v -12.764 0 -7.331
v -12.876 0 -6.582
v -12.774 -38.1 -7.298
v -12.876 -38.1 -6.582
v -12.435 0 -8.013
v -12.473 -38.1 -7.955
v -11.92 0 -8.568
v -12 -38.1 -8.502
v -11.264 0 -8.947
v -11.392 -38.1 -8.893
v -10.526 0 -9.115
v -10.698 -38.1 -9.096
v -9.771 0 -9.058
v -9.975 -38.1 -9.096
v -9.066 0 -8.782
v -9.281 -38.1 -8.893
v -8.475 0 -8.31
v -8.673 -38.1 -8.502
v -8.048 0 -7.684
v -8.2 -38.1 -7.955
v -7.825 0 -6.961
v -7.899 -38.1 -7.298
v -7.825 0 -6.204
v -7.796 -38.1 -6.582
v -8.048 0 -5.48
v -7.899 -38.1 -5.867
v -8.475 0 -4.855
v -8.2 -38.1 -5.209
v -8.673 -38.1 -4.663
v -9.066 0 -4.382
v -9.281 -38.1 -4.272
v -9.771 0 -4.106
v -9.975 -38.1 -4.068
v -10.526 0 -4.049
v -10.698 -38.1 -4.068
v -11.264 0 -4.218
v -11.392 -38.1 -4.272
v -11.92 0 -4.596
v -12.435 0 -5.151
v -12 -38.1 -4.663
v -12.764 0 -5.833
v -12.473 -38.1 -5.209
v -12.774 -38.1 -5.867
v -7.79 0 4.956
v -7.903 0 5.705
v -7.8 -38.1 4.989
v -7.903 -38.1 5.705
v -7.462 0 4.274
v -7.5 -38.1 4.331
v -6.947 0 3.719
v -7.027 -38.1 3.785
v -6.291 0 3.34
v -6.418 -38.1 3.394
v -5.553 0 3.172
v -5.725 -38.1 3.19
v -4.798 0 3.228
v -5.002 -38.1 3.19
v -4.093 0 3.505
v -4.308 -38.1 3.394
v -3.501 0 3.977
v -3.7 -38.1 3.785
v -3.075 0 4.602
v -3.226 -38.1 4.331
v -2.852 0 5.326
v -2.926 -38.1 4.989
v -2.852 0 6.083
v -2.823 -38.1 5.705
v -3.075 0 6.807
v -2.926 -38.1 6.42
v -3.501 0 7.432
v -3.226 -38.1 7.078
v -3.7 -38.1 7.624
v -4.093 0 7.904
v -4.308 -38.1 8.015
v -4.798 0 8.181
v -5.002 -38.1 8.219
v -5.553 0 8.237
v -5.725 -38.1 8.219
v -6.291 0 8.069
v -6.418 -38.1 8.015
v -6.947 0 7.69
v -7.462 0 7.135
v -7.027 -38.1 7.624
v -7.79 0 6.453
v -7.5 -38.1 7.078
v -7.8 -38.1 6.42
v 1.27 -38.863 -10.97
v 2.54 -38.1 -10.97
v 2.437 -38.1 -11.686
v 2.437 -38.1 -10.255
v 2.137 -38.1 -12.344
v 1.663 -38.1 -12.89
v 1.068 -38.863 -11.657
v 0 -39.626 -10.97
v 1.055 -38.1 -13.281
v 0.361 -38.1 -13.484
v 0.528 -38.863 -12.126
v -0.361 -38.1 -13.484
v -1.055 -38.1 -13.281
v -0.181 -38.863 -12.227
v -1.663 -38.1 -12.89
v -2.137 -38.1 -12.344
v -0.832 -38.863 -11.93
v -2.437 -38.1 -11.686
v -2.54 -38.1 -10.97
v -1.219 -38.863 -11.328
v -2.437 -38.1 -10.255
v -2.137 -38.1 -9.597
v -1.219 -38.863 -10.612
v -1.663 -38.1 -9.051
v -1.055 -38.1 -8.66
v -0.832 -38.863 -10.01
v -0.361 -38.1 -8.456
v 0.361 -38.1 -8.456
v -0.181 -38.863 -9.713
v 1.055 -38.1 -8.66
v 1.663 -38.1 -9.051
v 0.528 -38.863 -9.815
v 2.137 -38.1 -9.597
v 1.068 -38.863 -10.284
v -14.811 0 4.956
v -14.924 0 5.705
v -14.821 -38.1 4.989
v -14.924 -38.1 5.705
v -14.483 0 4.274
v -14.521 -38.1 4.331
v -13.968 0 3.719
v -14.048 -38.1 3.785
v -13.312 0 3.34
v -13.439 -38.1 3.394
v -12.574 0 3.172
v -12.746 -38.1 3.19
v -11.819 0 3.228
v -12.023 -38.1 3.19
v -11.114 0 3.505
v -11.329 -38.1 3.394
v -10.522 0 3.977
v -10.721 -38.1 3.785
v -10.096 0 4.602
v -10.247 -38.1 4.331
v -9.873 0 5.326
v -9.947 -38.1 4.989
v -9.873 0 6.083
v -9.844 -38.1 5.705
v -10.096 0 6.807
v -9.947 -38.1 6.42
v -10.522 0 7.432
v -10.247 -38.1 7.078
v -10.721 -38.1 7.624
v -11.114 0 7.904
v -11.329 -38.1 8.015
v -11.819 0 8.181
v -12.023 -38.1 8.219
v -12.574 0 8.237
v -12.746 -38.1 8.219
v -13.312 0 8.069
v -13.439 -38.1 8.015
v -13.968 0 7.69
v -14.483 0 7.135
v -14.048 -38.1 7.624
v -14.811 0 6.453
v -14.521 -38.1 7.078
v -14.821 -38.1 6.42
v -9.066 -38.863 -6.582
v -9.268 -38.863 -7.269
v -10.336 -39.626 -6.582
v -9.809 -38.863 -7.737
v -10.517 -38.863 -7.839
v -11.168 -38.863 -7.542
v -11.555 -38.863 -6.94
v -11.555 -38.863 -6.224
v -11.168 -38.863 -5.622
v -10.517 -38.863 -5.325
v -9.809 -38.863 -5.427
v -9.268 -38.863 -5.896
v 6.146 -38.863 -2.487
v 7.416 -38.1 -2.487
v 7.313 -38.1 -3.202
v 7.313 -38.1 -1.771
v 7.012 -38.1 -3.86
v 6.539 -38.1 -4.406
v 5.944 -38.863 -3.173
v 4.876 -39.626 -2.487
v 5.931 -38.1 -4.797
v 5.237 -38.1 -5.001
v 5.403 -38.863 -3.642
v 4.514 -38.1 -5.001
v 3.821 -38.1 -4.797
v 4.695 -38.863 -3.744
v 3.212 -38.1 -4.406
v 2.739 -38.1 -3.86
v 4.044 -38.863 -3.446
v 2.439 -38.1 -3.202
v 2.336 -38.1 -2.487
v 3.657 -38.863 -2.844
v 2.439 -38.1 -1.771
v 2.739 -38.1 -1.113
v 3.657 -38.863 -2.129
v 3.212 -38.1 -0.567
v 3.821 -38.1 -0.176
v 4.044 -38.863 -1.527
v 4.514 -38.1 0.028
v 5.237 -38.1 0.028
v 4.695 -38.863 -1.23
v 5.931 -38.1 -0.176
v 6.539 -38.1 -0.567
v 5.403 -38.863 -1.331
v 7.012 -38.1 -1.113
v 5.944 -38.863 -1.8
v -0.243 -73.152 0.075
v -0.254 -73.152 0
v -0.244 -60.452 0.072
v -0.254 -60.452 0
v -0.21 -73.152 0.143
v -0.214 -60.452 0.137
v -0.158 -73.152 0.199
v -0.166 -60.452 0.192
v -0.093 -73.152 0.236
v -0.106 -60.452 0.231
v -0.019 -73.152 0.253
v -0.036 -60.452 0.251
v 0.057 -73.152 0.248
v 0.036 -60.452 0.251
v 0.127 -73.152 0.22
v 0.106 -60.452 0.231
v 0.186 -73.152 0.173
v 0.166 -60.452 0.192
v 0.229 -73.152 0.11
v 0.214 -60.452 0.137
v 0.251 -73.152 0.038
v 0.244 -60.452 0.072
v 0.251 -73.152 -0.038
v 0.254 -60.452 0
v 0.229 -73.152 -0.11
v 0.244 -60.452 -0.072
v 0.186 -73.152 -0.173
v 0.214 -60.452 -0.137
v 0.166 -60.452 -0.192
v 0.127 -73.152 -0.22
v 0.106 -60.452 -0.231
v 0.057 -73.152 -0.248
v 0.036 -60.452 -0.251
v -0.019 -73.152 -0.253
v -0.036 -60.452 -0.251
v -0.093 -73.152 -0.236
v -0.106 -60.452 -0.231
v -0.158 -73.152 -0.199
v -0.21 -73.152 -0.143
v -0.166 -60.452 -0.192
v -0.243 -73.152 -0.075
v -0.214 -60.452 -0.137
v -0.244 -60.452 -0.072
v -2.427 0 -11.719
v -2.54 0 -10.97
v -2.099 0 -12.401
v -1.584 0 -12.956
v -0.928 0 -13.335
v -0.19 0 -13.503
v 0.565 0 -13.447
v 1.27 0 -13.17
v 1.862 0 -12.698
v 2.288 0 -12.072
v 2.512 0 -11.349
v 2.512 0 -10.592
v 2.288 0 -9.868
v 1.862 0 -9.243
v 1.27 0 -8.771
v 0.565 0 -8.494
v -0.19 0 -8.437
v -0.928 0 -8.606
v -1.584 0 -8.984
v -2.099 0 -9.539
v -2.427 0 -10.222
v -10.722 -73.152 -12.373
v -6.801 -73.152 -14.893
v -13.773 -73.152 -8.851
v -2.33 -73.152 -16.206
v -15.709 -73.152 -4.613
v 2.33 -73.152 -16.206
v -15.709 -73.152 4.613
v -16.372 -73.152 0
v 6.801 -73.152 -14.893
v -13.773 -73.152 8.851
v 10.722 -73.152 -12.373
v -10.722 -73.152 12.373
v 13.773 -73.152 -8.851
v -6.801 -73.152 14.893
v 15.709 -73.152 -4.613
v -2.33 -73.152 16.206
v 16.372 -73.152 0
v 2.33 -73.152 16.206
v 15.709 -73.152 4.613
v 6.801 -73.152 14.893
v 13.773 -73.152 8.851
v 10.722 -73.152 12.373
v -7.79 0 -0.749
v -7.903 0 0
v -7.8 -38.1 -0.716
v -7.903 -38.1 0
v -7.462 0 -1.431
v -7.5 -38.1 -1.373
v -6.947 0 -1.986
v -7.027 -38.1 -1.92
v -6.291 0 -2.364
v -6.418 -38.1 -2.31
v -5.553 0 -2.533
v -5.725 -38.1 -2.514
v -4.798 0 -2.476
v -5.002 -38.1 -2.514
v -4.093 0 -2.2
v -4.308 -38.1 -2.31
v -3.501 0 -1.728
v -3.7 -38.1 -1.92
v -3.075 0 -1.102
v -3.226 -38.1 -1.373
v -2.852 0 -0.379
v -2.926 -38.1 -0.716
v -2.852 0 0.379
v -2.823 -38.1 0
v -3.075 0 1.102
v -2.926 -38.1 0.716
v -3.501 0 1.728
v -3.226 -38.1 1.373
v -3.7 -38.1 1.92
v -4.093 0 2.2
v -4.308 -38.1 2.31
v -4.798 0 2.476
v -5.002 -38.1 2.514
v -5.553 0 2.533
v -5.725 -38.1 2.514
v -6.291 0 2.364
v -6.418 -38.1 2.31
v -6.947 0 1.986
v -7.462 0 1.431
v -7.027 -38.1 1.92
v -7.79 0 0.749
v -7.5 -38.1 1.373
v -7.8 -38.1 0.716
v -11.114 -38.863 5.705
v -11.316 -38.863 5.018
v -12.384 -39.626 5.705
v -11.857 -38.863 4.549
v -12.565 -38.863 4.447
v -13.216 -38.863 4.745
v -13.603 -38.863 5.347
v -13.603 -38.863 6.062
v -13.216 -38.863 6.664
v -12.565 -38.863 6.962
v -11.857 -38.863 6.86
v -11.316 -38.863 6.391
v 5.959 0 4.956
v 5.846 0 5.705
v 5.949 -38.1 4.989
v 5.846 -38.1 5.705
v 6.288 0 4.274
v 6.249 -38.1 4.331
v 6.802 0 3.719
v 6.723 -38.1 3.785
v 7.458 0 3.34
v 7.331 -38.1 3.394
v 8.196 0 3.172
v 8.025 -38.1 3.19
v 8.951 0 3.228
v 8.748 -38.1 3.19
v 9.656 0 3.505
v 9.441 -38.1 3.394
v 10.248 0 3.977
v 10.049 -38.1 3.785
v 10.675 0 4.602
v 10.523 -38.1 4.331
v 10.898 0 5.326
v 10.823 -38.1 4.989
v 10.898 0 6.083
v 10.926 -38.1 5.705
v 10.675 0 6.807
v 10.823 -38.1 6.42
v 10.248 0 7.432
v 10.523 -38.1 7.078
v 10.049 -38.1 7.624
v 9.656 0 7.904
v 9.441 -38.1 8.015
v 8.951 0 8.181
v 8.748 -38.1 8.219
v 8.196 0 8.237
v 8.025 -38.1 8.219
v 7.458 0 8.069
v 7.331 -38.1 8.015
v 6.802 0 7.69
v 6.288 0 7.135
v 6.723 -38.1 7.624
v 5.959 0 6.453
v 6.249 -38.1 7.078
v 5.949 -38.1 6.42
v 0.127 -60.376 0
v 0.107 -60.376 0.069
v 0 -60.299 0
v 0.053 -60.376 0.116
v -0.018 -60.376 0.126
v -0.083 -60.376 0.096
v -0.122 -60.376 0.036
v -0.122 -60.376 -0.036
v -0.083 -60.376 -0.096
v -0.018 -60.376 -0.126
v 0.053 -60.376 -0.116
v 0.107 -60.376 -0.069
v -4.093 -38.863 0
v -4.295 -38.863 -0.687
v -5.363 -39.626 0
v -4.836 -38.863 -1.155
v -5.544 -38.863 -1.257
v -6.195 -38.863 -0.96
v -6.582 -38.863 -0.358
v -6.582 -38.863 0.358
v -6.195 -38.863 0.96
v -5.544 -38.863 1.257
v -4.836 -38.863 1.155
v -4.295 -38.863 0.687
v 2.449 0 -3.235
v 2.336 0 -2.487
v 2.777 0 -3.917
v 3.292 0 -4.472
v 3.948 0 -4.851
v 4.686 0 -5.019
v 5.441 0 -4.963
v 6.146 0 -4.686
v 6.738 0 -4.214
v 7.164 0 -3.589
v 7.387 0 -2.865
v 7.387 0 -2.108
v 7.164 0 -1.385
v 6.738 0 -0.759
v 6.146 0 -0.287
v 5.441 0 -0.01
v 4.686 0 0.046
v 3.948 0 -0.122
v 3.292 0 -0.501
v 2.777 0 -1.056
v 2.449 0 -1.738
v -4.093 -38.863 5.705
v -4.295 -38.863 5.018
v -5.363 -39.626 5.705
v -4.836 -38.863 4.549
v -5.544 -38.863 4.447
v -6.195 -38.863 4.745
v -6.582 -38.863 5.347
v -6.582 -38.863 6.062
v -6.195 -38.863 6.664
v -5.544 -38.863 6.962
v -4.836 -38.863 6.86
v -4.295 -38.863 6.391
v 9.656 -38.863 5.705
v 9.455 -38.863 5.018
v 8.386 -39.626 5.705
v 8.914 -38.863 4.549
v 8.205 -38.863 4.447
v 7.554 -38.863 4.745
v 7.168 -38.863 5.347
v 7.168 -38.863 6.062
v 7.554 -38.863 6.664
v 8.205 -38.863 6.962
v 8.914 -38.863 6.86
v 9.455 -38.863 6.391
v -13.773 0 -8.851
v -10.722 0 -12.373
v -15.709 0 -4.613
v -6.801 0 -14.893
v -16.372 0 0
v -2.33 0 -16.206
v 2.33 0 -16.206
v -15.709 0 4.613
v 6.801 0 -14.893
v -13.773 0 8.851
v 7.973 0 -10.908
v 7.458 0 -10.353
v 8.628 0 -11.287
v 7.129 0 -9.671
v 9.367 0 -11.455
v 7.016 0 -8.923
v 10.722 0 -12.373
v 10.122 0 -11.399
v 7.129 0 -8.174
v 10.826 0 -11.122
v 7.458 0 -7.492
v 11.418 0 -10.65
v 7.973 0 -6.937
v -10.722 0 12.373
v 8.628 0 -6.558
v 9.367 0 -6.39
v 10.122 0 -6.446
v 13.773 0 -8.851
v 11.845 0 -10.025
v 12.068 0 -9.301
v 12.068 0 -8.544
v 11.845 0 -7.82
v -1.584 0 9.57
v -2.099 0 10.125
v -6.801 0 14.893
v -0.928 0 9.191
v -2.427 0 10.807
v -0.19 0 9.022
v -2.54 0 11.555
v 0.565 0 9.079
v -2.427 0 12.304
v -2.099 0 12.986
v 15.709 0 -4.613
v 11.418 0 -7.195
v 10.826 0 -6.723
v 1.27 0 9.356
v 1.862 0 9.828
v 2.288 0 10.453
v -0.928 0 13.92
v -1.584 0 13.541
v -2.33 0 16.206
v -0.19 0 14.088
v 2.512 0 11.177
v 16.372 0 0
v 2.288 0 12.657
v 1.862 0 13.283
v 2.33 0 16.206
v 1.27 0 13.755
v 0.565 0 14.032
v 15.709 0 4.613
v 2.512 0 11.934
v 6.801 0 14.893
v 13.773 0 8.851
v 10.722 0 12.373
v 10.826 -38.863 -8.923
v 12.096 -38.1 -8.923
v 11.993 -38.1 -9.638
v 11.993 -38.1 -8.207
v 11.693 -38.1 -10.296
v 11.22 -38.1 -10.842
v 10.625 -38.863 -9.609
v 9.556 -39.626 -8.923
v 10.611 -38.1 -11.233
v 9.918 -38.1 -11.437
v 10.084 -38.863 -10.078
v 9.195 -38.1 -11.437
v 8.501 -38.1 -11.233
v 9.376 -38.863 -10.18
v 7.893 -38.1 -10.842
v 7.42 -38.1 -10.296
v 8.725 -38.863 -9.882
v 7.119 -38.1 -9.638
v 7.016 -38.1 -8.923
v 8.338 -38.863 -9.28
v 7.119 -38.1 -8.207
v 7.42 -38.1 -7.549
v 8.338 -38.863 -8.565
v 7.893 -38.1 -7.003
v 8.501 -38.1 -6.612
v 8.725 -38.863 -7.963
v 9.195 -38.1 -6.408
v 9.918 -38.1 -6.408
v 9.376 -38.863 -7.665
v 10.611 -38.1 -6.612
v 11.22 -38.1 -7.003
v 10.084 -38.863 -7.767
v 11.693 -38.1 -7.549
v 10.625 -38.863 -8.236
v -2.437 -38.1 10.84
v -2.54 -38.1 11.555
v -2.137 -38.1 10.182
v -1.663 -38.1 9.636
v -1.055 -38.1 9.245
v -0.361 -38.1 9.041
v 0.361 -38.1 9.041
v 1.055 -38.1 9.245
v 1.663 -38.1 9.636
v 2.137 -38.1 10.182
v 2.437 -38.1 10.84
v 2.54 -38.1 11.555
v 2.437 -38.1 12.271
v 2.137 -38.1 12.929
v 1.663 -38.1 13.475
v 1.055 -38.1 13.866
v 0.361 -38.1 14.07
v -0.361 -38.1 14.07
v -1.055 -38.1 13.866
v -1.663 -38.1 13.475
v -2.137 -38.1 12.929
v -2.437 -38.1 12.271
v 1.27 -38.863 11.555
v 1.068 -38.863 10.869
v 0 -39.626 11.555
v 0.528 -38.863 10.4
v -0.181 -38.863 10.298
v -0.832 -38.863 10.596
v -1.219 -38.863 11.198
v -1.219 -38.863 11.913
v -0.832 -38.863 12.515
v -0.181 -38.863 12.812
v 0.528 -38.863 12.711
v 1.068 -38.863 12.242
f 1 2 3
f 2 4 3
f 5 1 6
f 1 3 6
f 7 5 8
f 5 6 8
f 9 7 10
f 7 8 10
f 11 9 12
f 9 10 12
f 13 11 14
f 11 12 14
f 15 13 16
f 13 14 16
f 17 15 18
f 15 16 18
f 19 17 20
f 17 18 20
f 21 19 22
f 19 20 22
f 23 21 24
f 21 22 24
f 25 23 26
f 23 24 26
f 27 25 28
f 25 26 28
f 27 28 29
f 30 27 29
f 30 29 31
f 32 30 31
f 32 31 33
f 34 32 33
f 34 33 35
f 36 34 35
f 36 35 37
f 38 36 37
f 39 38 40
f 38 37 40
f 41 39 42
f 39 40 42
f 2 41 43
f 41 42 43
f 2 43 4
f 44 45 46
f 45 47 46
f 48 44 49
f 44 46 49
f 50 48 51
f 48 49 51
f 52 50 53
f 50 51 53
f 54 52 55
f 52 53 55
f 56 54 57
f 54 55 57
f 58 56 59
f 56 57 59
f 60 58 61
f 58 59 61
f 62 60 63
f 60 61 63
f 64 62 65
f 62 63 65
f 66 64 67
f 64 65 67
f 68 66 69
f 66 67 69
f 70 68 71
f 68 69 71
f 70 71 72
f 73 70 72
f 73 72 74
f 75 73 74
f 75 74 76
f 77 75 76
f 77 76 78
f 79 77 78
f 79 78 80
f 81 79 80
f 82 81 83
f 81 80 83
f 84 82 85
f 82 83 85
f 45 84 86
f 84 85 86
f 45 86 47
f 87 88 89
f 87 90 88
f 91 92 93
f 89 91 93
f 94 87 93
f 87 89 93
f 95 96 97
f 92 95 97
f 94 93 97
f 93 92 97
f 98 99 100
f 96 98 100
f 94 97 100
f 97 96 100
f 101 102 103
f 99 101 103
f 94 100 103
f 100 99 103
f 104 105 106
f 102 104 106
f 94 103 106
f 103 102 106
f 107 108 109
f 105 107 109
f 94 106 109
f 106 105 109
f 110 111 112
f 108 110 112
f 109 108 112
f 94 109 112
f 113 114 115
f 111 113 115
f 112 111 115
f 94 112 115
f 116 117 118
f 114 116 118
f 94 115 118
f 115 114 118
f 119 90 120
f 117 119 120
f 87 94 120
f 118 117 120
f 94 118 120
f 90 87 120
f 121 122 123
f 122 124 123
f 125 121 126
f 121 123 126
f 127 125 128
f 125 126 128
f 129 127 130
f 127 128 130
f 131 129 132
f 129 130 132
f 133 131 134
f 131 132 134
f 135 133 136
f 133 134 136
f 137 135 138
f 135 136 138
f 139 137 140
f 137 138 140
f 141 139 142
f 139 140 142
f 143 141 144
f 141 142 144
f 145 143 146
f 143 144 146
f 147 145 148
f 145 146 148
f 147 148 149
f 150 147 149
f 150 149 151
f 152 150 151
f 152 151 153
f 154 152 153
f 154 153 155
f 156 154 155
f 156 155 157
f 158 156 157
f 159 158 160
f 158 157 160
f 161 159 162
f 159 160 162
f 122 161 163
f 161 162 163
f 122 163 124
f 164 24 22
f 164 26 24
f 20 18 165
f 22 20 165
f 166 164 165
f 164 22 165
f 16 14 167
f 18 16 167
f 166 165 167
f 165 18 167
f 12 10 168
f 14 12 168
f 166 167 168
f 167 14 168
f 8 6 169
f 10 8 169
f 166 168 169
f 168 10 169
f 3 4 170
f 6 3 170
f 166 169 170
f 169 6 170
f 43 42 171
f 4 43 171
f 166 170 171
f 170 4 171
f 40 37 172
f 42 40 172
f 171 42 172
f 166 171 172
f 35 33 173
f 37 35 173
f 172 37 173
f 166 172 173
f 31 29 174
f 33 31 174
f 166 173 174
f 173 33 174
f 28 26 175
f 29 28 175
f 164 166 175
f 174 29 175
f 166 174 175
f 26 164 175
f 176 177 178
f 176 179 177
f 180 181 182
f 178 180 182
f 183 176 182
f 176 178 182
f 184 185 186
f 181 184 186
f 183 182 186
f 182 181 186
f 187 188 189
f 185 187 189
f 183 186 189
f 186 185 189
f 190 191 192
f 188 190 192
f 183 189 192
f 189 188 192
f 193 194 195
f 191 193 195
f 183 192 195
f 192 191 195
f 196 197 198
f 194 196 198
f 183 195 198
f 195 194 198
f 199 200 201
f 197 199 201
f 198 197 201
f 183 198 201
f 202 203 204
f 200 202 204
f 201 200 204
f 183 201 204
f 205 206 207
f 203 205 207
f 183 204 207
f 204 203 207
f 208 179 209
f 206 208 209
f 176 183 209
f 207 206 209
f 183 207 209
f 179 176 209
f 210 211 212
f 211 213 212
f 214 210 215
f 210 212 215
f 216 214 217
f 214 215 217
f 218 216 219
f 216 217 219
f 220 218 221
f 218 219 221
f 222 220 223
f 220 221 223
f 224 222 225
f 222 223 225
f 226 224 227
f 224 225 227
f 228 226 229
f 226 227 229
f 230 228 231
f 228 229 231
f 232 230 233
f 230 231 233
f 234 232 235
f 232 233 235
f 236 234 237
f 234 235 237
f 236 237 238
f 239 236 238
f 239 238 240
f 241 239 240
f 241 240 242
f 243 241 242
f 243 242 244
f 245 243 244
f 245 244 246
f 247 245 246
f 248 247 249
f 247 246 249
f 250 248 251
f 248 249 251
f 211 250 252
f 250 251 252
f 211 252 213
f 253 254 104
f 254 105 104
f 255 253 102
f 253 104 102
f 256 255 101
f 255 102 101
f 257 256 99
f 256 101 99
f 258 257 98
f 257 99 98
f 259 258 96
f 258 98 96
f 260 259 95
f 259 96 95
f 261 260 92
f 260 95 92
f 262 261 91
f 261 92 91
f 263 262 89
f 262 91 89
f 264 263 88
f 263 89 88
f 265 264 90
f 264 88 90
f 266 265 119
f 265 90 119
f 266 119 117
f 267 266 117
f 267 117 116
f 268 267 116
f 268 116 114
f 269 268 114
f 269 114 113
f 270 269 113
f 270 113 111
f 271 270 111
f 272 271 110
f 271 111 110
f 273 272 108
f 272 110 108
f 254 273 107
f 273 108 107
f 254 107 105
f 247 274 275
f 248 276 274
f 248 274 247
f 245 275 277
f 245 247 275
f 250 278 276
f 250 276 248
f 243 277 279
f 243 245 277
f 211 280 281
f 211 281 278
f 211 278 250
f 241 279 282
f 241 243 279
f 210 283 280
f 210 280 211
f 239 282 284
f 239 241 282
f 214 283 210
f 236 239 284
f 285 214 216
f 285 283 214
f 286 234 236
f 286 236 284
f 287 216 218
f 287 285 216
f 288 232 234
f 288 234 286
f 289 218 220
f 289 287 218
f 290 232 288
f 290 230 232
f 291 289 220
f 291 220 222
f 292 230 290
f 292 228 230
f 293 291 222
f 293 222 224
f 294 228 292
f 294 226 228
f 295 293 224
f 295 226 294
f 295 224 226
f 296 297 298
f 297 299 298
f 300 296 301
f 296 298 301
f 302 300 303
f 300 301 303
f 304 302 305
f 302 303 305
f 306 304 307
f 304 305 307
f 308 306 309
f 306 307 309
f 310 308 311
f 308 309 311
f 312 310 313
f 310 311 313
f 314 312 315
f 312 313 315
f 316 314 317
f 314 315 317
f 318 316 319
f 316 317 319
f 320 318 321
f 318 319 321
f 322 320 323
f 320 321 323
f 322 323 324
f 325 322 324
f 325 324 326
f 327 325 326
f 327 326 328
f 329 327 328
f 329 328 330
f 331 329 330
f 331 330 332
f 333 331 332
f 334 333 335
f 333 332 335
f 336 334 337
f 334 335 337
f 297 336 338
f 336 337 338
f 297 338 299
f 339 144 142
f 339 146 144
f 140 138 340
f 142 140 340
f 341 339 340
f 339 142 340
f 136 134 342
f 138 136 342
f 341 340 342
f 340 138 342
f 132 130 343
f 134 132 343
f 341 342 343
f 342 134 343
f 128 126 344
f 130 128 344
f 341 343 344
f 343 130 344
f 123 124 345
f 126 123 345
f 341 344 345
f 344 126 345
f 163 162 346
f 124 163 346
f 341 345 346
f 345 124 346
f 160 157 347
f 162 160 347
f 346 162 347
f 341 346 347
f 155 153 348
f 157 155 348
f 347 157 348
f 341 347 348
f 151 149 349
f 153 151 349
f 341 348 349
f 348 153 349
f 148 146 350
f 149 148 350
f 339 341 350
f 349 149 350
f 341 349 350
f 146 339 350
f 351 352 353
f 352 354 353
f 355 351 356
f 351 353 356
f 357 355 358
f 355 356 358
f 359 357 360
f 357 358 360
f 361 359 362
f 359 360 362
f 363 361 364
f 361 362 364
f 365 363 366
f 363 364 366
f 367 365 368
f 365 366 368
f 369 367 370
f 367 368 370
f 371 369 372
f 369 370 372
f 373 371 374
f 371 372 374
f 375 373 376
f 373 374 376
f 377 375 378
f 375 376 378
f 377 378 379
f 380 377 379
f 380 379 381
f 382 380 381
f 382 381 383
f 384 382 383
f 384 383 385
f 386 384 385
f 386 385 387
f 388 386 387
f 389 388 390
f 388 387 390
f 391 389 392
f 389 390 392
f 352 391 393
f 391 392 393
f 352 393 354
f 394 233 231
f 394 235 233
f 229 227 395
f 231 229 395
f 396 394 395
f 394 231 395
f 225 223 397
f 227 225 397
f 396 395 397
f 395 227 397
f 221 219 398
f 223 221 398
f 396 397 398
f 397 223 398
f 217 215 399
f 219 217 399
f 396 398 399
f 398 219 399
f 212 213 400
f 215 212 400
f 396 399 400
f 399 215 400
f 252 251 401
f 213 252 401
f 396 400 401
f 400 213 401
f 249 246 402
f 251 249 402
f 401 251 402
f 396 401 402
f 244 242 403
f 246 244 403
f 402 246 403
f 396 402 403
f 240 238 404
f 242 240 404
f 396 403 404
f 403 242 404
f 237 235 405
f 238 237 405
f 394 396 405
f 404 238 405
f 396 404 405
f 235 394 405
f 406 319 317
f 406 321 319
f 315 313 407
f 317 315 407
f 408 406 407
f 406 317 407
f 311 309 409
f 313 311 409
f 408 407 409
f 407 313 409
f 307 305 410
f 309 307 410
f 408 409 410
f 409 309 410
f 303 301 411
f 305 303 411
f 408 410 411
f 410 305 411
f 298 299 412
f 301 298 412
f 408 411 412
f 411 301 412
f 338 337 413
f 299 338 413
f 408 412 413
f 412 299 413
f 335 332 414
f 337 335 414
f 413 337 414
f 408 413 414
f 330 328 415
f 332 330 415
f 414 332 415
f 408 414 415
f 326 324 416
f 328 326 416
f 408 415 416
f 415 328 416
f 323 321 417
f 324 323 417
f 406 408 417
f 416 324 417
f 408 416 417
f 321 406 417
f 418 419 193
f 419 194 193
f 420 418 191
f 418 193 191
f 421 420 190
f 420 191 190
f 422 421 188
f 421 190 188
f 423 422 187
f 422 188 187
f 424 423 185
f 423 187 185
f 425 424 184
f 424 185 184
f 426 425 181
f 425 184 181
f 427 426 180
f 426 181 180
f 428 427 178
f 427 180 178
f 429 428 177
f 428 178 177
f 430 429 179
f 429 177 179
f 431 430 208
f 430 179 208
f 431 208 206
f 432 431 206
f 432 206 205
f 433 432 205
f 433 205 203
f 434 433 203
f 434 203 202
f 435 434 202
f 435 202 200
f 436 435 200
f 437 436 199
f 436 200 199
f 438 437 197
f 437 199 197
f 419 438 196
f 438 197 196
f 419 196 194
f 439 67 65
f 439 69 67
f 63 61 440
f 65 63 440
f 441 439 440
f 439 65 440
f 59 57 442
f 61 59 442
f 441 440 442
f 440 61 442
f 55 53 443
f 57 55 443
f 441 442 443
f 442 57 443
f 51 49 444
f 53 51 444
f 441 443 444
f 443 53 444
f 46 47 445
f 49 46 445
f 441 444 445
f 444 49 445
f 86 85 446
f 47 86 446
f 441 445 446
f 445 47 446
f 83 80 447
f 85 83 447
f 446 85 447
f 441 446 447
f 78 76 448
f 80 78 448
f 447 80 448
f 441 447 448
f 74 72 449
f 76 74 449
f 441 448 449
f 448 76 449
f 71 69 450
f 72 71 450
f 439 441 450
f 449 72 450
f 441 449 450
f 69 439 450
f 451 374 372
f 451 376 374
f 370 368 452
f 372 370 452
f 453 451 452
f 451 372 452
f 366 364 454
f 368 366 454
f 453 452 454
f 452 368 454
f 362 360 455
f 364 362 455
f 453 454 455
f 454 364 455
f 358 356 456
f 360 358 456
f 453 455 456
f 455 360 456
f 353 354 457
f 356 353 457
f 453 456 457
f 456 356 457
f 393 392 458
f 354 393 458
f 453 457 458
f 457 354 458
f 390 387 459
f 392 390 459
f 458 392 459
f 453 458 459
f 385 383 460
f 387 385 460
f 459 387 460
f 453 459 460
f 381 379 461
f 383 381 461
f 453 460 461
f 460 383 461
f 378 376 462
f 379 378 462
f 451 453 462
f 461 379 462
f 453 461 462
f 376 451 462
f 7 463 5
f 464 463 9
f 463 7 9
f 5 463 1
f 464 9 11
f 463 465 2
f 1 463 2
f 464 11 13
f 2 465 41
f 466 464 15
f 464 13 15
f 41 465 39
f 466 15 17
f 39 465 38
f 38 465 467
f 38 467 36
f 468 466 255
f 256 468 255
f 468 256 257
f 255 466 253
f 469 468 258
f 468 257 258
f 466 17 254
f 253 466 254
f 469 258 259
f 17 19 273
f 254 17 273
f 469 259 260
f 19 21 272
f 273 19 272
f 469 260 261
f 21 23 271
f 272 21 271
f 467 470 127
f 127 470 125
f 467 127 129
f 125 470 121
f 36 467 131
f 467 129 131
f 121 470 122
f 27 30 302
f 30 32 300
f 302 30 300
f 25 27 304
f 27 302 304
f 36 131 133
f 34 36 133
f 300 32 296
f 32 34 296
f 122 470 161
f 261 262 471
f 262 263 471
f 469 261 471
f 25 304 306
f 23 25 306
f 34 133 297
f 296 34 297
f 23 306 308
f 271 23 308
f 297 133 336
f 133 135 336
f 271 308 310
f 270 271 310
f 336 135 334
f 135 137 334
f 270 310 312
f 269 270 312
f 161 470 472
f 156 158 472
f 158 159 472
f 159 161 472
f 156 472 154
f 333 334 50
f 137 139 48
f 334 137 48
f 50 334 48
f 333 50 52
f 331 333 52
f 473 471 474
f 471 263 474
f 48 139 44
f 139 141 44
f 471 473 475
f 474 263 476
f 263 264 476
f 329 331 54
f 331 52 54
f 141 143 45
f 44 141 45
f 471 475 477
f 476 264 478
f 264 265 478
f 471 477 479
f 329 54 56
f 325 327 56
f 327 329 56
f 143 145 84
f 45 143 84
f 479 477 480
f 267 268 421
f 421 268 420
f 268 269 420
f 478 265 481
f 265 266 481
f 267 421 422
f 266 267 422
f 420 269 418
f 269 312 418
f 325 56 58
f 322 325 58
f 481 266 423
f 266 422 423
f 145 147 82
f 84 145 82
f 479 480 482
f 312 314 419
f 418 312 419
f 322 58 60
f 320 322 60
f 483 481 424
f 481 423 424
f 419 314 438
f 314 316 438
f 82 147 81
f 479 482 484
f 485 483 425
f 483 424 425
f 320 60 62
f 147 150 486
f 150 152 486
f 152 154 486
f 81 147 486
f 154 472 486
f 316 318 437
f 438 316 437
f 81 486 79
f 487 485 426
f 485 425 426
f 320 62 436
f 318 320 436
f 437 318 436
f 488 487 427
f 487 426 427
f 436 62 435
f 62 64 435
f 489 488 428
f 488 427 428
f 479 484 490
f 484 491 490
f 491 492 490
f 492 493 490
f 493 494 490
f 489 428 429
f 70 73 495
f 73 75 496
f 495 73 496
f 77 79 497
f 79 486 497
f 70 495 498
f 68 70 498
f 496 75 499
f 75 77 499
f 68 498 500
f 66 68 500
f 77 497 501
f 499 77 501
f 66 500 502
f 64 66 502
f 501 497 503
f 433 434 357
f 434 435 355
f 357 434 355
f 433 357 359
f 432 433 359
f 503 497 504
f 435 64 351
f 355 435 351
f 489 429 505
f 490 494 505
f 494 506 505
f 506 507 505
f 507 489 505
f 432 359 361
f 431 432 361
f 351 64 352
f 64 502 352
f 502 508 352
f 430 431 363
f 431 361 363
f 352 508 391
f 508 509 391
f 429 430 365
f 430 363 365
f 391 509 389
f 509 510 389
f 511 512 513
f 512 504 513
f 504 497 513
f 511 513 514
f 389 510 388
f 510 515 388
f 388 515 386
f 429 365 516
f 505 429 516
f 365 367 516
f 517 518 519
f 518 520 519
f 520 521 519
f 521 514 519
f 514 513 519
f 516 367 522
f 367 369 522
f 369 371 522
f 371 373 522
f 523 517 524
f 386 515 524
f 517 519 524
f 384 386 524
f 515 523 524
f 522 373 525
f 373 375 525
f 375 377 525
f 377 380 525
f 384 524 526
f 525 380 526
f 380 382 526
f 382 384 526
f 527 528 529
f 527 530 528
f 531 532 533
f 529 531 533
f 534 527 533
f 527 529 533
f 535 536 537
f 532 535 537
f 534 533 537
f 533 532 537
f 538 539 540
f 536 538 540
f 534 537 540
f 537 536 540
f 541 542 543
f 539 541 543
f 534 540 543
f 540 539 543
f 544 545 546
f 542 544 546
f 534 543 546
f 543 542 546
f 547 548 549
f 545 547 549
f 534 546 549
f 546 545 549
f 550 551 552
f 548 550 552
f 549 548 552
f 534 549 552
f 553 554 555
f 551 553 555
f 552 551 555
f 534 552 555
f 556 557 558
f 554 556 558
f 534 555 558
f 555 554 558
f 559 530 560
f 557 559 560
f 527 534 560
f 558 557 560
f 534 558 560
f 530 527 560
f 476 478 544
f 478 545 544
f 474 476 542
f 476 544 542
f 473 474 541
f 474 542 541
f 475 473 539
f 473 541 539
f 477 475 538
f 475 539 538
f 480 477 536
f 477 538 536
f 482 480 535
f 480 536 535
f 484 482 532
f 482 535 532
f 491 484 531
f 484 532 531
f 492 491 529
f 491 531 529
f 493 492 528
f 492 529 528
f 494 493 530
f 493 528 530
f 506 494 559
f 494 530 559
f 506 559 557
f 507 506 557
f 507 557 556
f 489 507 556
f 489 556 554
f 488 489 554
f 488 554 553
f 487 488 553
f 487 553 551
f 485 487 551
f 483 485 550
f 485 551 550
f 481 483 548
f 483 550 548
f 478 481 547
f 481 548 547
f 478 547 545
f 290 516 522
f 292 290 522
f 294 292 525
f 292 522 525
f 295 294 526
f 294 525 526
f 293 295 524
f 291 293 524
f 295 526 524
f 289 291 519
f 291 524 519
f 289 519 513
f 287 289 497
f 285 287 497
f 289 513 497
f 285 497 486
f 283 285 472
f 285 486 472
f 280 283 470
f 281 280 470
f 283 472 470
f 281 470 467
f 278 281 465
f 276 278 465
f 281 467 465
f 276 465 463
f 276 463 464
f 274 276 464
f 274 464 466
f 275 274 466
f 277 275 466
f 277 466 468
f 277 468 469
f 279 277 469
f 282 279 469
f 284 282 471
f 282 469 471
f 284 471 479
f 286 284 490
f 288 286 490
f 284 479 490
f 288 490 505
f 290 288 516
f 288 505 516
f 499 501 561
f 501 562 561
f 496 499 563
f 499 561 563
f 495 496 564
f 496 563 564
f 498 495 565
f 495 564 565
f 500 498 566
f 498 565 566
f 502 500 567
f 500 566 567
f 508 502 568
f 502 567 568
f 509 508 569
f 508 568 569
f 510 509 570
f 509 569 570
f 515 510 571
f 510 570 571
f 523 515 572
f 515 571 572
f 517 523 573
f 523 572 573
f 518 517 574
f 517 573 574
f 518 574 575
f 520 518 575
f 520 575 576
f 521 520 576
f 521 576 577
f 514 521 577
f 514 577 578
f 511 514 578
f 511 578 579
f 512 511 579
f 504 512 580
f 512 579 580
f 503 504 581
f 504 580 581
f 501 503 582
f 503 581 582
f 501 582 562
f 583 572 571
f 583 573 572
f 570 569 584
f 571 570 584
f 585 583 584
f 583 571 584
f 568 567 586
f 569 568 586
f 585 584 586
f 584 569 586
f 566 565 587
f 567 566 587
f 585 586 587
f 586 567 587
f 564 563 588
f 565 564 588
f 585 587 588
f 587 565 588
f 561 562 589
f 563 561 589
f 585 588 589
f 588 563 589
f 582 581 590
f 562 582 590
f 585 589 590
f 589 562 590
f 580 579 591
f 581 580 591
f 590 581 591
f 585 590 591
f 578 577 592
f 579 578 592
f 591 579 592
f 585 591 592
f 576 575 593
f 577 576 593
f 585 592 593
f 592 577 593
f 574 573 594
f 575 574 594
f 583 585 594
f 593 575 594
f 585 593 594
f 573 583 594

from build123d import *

# Parameters (mm, degrees)
F0_R     = 16.3722286136
F1_DEPTH = 73.152
F3_D     = 0.508
F3_DEPTH = 12.7
F3_TIP   = 0.1526185972
F5_D     = 5.08
F5_DEPTH = 38.1
F5_TIP   = 1.5261859723


with BuildPart() as f1:
    # F0 (on Front) → F1 (new body)
    with BuildSketch(Plane.XZ):
        Circle(F0_R)
    extrude(amount=F1_DEPTH)

    # F3
    with Locations(Plane.XZ.offset(73.152)):
        with Locations((0, 0)):
            Hole(F3_D / 2, depth=F3_DEPTH)
            with Locations((0, 0, -(F3_DEPTH + F3_TIP / 2))):  # 118° drill point
                Cone(0, F3_D / 2, F3_TIP, mode=Mode.SUBTRACT)

    # F5
    with Locations(Plane(origin=(0, 0, 0), x_dir=(1, 0, 0), z_dir=(0, 1, 0))):
        with Locations((-12.3842703179, -5.7045519352), (-5.3632836789, -5.7045519352), (0, -11.5553746), (8.3861500025, -5.7045519352), (-5.3632836789, 0), (4.8756562173, 2.4865996093), (9.556314908, 8.9225051925), (0, 10.9702926129), (-10.3364828974, 6.5821758471)):
            Hole(F5_D / 2, depth=F5_DEPTH)
            with Locations((0, 0, -(F5_DEPTH + F5_TIP / 2))):  # 118° drill point
                Cone(0, F5_D / 2, F5_TIP, mode=Mode.SUBTRACT)


solid = f1.part
